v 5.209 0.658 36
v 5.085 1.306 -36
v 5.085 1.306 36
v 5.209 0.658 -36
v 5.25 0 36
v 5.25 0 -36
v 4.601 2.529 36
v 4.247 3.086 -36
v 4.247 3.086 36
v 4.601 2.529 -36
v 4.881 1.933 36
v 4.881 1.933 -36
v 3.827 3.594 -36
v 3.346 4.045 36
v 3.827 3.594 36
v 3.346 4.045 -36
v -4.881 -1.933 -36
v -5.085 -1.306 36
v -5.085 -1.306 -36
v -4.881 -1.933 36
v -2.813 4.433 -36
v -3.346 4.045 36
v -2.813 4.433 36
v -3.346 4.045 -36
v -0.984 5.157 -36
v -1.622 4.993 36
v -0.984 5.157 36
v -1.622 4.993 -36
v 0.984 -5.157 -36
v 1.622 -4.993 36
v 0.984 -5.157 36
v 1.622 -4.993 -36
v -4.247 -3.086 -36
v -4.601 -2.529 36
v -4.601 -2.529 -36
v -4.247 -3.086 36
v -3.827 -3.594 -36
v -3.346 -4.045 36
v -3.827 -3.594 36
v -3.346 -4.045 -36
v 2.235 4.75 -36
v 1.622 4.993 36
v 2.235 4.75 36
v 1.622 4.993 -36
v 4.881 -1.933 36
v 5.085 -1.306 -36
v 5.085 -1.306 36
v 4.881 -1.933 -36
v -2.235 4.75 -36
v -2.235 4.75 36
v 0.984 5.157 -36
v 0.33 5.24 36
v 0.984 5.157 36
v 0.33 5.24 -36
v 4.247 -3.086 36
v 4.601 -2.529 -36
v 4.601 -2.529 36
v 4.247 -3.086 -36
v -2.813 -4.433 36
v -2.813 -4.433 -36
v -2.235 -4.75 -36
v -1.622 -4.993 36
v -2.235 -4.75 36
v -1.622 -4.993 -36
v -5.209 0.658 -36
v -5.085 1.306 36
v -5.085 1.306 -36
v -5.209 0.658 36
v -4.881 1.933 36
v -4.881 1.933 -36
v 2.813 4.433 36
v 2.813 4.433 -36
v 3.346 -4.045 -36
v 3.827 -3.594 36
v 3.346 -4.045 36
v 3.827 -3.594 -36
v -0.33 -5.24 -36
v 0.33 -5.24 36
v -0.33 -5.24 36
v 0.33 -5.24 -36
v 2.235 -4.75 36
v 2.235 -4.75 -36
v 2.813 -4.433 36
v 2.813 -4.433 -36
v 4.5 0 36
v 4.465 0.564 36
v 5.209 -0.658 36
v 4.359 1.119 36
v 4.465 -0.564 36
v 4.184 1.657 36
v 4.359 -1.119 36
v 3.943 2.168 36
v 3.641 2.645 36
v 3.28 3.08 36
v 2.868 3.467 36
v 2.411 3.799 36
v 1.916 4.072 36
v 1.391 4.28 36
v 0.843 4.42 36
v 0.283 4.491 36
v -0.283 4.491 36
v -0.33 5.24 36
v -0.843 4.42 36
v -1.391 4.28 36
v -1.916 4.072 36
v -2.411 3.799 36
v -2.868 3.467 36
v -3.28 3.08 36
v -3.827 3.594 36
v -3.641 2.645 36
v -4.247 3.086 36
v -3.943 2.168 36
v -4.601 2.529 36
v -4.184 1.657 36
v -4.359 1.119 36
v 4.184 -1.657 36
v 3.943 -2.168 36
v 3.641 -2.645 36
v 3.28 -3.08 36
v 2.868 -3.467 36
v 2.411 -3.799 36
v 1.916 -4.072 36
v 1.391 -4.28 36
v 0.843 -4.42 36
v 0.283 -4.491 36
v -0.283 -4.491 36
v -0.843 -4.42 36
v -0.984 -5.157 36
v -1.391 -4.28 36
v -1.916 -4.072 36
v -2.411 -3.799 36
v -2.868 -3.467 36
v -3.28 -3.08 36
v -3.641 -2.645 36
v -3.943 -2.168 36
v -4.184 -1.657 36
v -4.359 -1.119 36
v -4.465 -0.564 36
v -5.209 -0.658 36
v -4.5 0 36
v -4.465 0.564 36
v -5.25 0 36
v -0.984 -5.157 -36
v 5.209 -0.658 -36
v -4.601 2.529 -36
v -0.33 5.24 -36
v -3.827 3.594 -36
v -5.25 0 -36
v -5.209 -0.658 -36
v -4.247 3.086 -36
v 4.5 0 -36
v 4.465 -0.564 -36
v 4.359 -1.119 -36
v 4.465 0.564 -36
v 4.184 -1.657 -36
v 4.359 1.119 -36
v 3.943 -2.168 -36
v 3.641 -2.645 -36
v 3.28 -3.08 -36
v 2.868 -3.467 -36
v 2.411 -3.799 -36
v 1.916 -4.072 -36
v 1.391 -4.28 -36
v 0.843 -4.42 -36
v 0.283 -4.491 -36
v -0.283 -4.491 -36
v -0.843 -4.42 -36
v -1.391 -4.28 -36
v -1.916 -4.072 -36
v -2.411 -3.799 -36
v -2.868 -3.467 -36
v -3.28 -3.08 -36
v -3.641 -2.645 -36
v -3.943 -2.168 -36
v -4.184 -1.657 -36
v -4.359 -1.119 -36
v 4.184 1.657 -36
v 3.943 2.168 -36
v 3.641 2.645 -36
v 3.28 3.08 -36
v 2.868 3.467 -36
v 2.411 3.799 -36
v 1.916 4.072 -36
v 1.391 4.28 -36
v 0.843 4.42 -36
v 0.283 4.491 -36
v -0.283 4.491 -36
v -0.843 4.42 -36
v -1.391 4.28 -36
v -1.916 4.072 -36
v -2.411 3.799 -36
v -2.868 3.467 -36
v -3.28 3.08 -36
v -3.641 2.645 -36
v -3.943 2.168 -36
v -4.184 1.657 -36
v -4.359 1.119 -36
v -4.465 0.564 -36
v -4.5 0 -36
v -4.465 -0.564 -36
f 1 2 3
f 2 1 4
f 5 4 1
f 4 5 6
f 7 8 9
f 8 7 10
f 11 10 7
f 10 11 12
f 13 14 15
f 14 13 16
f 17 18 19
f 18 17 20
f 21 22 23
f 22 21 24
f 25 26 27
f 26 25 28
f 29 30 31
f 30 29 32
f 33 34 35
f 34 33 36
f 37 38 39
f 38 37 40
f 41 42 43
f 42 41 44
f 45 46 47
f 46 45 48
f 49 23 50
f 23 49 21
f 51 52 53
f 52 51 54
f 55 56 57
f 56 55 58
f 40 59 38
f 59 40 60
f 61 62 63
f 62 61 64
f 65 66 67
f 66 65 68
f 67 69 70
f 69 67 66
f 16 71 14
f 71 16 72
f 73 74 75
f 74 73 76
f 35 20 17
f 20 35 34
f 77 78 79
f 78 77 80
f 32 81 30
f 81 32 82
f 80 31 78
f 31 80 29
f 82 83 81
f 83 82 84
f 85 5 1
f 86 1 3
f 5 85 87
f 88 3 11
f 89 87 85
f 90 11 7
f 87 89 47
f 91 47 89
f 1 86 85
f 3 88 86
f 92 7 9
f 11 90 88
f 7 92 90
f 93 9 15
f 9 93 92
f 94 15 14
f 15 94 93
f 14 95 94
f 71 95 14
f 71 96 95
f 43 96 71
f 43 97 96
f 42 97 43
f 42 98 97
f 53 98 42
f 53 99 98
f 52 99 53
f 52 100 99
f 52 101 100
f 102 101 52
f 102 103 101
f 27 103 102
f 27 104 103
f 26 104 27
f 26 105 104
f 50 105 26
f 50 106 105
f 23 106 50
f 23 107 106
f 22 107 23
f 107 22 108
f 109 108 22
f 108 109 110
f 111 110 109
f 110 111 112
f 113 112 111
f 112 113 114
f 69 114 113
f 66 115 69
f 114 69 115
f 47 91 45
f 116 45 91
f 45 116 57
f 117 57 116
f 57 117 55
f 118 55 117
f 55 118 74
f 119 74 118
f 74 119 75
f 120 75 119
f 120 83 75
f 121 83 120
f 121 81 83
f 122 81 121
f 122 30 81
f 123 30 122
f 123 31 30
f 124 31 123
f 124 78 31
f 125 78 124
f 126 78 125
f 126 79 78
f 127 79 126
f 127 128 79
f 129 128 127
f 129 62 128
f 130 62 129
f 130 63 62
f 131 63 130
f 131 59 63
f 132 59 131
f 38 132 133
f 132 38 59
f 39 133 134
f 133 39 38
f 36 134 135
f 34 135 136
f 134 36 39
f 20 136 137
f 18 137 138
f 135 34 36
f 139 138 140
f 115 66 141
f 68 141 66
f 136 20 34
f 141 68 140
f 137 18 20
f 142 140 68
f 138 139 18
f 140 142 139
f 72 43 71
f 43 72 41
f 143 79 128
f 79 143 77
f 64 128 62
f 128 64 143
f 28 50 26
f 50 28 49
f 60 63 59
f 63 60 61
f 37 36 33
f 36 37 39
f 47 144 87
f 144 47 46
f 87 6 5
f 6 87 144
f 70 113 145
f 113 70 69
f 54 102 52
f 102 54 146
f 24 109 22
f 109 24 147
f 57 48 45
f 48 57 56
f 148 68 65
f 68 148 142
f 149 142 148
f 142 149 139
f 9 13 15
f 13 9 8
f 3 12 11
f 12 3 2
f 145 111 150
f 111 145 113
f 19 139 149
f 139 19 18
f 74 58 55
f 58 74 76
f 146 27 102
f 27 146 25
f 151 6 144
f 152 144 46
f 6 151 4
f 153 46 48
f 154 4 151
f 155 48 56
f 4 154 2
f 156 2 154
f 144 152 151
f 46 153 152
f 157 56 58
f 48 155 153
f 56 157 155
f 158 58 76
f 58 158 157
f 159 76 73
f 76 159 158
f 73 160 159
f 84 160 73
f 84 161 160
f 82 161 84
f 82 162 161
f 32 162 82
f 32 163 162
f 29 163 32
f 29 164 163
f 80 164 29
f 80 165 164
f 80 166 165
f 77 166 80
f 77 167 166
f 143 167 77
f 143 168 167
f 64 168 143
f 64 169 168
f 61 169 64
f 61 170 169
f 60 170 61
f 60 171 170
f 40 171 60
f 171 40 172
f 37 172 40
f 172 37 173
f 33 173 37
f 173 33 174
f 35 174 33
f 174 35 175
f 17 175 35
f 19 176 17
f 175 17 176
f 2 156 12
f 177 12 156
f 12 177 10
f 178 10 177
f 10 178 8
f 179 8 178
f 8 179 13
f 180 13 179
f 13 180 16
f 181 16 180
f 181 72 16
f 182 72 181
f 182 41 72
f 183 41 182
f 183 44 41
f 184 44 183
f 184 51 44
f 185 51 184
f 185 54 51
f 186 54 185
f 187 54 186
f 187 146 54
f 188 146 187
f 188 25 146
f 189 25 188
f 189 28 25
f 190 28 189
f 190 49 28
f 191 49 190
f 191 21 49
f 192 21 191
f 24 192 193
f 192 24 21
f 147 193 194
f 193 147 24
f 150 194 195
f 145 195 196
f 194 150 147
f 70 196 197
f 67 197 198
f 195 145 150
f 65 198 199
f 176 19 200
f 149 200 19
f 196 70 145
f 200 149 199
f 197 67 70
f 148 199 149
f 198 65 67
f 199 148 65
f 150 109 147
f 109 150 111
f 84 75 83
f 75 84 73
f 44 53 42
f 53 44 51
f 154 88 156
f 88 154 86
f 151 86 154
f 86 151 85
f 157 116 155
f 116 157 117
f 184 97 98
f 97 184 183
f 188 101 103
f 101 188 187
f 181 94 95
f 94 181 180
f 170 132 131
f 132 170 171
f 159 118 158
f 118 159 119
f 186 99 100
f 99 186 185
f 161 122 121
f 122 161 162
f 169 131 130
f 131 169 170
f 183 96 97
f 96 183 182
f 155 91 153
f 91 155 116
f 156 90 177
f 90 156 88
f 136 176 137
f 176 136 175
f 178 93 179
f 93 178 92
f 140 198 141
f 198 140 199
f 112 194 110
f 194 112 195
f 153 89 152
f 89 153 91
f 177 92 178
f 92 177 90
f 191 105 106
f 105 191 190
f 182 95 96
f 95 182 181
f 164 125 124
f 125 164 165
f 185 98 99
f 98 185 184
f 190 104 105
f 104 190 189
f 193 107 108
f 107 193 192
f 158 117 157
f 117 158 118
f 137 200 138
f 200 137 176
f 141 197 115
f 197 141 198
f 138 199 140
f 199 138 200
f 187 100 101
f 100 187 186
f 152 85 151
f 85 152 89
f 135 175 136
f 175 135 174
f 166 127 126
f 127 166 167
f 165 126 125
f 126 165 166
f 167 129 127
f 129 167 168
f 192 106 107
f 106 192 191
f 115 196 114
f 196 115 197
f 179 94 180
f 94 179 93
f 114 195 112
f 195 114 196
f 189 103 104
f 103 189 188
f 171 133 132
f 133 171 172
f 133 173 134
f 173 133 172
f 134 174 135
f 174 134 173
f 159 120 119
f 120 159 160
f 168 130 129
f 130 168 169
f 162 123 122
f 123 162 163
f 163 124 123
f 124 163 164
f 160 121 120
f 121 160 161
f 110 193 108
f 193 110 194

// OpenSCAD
$fn = 50;


difference() {
	union() {
		translate(v = [0, 0, -36.0000000000]) {
			cylinder(h = 72, r = 5.2500000000);
		}
	}
	union() {
		translate(v = [0, 0, -100.0000000000]) {
			cylinder(h = 200, r = 4.5000000000);
		}
	}
}
